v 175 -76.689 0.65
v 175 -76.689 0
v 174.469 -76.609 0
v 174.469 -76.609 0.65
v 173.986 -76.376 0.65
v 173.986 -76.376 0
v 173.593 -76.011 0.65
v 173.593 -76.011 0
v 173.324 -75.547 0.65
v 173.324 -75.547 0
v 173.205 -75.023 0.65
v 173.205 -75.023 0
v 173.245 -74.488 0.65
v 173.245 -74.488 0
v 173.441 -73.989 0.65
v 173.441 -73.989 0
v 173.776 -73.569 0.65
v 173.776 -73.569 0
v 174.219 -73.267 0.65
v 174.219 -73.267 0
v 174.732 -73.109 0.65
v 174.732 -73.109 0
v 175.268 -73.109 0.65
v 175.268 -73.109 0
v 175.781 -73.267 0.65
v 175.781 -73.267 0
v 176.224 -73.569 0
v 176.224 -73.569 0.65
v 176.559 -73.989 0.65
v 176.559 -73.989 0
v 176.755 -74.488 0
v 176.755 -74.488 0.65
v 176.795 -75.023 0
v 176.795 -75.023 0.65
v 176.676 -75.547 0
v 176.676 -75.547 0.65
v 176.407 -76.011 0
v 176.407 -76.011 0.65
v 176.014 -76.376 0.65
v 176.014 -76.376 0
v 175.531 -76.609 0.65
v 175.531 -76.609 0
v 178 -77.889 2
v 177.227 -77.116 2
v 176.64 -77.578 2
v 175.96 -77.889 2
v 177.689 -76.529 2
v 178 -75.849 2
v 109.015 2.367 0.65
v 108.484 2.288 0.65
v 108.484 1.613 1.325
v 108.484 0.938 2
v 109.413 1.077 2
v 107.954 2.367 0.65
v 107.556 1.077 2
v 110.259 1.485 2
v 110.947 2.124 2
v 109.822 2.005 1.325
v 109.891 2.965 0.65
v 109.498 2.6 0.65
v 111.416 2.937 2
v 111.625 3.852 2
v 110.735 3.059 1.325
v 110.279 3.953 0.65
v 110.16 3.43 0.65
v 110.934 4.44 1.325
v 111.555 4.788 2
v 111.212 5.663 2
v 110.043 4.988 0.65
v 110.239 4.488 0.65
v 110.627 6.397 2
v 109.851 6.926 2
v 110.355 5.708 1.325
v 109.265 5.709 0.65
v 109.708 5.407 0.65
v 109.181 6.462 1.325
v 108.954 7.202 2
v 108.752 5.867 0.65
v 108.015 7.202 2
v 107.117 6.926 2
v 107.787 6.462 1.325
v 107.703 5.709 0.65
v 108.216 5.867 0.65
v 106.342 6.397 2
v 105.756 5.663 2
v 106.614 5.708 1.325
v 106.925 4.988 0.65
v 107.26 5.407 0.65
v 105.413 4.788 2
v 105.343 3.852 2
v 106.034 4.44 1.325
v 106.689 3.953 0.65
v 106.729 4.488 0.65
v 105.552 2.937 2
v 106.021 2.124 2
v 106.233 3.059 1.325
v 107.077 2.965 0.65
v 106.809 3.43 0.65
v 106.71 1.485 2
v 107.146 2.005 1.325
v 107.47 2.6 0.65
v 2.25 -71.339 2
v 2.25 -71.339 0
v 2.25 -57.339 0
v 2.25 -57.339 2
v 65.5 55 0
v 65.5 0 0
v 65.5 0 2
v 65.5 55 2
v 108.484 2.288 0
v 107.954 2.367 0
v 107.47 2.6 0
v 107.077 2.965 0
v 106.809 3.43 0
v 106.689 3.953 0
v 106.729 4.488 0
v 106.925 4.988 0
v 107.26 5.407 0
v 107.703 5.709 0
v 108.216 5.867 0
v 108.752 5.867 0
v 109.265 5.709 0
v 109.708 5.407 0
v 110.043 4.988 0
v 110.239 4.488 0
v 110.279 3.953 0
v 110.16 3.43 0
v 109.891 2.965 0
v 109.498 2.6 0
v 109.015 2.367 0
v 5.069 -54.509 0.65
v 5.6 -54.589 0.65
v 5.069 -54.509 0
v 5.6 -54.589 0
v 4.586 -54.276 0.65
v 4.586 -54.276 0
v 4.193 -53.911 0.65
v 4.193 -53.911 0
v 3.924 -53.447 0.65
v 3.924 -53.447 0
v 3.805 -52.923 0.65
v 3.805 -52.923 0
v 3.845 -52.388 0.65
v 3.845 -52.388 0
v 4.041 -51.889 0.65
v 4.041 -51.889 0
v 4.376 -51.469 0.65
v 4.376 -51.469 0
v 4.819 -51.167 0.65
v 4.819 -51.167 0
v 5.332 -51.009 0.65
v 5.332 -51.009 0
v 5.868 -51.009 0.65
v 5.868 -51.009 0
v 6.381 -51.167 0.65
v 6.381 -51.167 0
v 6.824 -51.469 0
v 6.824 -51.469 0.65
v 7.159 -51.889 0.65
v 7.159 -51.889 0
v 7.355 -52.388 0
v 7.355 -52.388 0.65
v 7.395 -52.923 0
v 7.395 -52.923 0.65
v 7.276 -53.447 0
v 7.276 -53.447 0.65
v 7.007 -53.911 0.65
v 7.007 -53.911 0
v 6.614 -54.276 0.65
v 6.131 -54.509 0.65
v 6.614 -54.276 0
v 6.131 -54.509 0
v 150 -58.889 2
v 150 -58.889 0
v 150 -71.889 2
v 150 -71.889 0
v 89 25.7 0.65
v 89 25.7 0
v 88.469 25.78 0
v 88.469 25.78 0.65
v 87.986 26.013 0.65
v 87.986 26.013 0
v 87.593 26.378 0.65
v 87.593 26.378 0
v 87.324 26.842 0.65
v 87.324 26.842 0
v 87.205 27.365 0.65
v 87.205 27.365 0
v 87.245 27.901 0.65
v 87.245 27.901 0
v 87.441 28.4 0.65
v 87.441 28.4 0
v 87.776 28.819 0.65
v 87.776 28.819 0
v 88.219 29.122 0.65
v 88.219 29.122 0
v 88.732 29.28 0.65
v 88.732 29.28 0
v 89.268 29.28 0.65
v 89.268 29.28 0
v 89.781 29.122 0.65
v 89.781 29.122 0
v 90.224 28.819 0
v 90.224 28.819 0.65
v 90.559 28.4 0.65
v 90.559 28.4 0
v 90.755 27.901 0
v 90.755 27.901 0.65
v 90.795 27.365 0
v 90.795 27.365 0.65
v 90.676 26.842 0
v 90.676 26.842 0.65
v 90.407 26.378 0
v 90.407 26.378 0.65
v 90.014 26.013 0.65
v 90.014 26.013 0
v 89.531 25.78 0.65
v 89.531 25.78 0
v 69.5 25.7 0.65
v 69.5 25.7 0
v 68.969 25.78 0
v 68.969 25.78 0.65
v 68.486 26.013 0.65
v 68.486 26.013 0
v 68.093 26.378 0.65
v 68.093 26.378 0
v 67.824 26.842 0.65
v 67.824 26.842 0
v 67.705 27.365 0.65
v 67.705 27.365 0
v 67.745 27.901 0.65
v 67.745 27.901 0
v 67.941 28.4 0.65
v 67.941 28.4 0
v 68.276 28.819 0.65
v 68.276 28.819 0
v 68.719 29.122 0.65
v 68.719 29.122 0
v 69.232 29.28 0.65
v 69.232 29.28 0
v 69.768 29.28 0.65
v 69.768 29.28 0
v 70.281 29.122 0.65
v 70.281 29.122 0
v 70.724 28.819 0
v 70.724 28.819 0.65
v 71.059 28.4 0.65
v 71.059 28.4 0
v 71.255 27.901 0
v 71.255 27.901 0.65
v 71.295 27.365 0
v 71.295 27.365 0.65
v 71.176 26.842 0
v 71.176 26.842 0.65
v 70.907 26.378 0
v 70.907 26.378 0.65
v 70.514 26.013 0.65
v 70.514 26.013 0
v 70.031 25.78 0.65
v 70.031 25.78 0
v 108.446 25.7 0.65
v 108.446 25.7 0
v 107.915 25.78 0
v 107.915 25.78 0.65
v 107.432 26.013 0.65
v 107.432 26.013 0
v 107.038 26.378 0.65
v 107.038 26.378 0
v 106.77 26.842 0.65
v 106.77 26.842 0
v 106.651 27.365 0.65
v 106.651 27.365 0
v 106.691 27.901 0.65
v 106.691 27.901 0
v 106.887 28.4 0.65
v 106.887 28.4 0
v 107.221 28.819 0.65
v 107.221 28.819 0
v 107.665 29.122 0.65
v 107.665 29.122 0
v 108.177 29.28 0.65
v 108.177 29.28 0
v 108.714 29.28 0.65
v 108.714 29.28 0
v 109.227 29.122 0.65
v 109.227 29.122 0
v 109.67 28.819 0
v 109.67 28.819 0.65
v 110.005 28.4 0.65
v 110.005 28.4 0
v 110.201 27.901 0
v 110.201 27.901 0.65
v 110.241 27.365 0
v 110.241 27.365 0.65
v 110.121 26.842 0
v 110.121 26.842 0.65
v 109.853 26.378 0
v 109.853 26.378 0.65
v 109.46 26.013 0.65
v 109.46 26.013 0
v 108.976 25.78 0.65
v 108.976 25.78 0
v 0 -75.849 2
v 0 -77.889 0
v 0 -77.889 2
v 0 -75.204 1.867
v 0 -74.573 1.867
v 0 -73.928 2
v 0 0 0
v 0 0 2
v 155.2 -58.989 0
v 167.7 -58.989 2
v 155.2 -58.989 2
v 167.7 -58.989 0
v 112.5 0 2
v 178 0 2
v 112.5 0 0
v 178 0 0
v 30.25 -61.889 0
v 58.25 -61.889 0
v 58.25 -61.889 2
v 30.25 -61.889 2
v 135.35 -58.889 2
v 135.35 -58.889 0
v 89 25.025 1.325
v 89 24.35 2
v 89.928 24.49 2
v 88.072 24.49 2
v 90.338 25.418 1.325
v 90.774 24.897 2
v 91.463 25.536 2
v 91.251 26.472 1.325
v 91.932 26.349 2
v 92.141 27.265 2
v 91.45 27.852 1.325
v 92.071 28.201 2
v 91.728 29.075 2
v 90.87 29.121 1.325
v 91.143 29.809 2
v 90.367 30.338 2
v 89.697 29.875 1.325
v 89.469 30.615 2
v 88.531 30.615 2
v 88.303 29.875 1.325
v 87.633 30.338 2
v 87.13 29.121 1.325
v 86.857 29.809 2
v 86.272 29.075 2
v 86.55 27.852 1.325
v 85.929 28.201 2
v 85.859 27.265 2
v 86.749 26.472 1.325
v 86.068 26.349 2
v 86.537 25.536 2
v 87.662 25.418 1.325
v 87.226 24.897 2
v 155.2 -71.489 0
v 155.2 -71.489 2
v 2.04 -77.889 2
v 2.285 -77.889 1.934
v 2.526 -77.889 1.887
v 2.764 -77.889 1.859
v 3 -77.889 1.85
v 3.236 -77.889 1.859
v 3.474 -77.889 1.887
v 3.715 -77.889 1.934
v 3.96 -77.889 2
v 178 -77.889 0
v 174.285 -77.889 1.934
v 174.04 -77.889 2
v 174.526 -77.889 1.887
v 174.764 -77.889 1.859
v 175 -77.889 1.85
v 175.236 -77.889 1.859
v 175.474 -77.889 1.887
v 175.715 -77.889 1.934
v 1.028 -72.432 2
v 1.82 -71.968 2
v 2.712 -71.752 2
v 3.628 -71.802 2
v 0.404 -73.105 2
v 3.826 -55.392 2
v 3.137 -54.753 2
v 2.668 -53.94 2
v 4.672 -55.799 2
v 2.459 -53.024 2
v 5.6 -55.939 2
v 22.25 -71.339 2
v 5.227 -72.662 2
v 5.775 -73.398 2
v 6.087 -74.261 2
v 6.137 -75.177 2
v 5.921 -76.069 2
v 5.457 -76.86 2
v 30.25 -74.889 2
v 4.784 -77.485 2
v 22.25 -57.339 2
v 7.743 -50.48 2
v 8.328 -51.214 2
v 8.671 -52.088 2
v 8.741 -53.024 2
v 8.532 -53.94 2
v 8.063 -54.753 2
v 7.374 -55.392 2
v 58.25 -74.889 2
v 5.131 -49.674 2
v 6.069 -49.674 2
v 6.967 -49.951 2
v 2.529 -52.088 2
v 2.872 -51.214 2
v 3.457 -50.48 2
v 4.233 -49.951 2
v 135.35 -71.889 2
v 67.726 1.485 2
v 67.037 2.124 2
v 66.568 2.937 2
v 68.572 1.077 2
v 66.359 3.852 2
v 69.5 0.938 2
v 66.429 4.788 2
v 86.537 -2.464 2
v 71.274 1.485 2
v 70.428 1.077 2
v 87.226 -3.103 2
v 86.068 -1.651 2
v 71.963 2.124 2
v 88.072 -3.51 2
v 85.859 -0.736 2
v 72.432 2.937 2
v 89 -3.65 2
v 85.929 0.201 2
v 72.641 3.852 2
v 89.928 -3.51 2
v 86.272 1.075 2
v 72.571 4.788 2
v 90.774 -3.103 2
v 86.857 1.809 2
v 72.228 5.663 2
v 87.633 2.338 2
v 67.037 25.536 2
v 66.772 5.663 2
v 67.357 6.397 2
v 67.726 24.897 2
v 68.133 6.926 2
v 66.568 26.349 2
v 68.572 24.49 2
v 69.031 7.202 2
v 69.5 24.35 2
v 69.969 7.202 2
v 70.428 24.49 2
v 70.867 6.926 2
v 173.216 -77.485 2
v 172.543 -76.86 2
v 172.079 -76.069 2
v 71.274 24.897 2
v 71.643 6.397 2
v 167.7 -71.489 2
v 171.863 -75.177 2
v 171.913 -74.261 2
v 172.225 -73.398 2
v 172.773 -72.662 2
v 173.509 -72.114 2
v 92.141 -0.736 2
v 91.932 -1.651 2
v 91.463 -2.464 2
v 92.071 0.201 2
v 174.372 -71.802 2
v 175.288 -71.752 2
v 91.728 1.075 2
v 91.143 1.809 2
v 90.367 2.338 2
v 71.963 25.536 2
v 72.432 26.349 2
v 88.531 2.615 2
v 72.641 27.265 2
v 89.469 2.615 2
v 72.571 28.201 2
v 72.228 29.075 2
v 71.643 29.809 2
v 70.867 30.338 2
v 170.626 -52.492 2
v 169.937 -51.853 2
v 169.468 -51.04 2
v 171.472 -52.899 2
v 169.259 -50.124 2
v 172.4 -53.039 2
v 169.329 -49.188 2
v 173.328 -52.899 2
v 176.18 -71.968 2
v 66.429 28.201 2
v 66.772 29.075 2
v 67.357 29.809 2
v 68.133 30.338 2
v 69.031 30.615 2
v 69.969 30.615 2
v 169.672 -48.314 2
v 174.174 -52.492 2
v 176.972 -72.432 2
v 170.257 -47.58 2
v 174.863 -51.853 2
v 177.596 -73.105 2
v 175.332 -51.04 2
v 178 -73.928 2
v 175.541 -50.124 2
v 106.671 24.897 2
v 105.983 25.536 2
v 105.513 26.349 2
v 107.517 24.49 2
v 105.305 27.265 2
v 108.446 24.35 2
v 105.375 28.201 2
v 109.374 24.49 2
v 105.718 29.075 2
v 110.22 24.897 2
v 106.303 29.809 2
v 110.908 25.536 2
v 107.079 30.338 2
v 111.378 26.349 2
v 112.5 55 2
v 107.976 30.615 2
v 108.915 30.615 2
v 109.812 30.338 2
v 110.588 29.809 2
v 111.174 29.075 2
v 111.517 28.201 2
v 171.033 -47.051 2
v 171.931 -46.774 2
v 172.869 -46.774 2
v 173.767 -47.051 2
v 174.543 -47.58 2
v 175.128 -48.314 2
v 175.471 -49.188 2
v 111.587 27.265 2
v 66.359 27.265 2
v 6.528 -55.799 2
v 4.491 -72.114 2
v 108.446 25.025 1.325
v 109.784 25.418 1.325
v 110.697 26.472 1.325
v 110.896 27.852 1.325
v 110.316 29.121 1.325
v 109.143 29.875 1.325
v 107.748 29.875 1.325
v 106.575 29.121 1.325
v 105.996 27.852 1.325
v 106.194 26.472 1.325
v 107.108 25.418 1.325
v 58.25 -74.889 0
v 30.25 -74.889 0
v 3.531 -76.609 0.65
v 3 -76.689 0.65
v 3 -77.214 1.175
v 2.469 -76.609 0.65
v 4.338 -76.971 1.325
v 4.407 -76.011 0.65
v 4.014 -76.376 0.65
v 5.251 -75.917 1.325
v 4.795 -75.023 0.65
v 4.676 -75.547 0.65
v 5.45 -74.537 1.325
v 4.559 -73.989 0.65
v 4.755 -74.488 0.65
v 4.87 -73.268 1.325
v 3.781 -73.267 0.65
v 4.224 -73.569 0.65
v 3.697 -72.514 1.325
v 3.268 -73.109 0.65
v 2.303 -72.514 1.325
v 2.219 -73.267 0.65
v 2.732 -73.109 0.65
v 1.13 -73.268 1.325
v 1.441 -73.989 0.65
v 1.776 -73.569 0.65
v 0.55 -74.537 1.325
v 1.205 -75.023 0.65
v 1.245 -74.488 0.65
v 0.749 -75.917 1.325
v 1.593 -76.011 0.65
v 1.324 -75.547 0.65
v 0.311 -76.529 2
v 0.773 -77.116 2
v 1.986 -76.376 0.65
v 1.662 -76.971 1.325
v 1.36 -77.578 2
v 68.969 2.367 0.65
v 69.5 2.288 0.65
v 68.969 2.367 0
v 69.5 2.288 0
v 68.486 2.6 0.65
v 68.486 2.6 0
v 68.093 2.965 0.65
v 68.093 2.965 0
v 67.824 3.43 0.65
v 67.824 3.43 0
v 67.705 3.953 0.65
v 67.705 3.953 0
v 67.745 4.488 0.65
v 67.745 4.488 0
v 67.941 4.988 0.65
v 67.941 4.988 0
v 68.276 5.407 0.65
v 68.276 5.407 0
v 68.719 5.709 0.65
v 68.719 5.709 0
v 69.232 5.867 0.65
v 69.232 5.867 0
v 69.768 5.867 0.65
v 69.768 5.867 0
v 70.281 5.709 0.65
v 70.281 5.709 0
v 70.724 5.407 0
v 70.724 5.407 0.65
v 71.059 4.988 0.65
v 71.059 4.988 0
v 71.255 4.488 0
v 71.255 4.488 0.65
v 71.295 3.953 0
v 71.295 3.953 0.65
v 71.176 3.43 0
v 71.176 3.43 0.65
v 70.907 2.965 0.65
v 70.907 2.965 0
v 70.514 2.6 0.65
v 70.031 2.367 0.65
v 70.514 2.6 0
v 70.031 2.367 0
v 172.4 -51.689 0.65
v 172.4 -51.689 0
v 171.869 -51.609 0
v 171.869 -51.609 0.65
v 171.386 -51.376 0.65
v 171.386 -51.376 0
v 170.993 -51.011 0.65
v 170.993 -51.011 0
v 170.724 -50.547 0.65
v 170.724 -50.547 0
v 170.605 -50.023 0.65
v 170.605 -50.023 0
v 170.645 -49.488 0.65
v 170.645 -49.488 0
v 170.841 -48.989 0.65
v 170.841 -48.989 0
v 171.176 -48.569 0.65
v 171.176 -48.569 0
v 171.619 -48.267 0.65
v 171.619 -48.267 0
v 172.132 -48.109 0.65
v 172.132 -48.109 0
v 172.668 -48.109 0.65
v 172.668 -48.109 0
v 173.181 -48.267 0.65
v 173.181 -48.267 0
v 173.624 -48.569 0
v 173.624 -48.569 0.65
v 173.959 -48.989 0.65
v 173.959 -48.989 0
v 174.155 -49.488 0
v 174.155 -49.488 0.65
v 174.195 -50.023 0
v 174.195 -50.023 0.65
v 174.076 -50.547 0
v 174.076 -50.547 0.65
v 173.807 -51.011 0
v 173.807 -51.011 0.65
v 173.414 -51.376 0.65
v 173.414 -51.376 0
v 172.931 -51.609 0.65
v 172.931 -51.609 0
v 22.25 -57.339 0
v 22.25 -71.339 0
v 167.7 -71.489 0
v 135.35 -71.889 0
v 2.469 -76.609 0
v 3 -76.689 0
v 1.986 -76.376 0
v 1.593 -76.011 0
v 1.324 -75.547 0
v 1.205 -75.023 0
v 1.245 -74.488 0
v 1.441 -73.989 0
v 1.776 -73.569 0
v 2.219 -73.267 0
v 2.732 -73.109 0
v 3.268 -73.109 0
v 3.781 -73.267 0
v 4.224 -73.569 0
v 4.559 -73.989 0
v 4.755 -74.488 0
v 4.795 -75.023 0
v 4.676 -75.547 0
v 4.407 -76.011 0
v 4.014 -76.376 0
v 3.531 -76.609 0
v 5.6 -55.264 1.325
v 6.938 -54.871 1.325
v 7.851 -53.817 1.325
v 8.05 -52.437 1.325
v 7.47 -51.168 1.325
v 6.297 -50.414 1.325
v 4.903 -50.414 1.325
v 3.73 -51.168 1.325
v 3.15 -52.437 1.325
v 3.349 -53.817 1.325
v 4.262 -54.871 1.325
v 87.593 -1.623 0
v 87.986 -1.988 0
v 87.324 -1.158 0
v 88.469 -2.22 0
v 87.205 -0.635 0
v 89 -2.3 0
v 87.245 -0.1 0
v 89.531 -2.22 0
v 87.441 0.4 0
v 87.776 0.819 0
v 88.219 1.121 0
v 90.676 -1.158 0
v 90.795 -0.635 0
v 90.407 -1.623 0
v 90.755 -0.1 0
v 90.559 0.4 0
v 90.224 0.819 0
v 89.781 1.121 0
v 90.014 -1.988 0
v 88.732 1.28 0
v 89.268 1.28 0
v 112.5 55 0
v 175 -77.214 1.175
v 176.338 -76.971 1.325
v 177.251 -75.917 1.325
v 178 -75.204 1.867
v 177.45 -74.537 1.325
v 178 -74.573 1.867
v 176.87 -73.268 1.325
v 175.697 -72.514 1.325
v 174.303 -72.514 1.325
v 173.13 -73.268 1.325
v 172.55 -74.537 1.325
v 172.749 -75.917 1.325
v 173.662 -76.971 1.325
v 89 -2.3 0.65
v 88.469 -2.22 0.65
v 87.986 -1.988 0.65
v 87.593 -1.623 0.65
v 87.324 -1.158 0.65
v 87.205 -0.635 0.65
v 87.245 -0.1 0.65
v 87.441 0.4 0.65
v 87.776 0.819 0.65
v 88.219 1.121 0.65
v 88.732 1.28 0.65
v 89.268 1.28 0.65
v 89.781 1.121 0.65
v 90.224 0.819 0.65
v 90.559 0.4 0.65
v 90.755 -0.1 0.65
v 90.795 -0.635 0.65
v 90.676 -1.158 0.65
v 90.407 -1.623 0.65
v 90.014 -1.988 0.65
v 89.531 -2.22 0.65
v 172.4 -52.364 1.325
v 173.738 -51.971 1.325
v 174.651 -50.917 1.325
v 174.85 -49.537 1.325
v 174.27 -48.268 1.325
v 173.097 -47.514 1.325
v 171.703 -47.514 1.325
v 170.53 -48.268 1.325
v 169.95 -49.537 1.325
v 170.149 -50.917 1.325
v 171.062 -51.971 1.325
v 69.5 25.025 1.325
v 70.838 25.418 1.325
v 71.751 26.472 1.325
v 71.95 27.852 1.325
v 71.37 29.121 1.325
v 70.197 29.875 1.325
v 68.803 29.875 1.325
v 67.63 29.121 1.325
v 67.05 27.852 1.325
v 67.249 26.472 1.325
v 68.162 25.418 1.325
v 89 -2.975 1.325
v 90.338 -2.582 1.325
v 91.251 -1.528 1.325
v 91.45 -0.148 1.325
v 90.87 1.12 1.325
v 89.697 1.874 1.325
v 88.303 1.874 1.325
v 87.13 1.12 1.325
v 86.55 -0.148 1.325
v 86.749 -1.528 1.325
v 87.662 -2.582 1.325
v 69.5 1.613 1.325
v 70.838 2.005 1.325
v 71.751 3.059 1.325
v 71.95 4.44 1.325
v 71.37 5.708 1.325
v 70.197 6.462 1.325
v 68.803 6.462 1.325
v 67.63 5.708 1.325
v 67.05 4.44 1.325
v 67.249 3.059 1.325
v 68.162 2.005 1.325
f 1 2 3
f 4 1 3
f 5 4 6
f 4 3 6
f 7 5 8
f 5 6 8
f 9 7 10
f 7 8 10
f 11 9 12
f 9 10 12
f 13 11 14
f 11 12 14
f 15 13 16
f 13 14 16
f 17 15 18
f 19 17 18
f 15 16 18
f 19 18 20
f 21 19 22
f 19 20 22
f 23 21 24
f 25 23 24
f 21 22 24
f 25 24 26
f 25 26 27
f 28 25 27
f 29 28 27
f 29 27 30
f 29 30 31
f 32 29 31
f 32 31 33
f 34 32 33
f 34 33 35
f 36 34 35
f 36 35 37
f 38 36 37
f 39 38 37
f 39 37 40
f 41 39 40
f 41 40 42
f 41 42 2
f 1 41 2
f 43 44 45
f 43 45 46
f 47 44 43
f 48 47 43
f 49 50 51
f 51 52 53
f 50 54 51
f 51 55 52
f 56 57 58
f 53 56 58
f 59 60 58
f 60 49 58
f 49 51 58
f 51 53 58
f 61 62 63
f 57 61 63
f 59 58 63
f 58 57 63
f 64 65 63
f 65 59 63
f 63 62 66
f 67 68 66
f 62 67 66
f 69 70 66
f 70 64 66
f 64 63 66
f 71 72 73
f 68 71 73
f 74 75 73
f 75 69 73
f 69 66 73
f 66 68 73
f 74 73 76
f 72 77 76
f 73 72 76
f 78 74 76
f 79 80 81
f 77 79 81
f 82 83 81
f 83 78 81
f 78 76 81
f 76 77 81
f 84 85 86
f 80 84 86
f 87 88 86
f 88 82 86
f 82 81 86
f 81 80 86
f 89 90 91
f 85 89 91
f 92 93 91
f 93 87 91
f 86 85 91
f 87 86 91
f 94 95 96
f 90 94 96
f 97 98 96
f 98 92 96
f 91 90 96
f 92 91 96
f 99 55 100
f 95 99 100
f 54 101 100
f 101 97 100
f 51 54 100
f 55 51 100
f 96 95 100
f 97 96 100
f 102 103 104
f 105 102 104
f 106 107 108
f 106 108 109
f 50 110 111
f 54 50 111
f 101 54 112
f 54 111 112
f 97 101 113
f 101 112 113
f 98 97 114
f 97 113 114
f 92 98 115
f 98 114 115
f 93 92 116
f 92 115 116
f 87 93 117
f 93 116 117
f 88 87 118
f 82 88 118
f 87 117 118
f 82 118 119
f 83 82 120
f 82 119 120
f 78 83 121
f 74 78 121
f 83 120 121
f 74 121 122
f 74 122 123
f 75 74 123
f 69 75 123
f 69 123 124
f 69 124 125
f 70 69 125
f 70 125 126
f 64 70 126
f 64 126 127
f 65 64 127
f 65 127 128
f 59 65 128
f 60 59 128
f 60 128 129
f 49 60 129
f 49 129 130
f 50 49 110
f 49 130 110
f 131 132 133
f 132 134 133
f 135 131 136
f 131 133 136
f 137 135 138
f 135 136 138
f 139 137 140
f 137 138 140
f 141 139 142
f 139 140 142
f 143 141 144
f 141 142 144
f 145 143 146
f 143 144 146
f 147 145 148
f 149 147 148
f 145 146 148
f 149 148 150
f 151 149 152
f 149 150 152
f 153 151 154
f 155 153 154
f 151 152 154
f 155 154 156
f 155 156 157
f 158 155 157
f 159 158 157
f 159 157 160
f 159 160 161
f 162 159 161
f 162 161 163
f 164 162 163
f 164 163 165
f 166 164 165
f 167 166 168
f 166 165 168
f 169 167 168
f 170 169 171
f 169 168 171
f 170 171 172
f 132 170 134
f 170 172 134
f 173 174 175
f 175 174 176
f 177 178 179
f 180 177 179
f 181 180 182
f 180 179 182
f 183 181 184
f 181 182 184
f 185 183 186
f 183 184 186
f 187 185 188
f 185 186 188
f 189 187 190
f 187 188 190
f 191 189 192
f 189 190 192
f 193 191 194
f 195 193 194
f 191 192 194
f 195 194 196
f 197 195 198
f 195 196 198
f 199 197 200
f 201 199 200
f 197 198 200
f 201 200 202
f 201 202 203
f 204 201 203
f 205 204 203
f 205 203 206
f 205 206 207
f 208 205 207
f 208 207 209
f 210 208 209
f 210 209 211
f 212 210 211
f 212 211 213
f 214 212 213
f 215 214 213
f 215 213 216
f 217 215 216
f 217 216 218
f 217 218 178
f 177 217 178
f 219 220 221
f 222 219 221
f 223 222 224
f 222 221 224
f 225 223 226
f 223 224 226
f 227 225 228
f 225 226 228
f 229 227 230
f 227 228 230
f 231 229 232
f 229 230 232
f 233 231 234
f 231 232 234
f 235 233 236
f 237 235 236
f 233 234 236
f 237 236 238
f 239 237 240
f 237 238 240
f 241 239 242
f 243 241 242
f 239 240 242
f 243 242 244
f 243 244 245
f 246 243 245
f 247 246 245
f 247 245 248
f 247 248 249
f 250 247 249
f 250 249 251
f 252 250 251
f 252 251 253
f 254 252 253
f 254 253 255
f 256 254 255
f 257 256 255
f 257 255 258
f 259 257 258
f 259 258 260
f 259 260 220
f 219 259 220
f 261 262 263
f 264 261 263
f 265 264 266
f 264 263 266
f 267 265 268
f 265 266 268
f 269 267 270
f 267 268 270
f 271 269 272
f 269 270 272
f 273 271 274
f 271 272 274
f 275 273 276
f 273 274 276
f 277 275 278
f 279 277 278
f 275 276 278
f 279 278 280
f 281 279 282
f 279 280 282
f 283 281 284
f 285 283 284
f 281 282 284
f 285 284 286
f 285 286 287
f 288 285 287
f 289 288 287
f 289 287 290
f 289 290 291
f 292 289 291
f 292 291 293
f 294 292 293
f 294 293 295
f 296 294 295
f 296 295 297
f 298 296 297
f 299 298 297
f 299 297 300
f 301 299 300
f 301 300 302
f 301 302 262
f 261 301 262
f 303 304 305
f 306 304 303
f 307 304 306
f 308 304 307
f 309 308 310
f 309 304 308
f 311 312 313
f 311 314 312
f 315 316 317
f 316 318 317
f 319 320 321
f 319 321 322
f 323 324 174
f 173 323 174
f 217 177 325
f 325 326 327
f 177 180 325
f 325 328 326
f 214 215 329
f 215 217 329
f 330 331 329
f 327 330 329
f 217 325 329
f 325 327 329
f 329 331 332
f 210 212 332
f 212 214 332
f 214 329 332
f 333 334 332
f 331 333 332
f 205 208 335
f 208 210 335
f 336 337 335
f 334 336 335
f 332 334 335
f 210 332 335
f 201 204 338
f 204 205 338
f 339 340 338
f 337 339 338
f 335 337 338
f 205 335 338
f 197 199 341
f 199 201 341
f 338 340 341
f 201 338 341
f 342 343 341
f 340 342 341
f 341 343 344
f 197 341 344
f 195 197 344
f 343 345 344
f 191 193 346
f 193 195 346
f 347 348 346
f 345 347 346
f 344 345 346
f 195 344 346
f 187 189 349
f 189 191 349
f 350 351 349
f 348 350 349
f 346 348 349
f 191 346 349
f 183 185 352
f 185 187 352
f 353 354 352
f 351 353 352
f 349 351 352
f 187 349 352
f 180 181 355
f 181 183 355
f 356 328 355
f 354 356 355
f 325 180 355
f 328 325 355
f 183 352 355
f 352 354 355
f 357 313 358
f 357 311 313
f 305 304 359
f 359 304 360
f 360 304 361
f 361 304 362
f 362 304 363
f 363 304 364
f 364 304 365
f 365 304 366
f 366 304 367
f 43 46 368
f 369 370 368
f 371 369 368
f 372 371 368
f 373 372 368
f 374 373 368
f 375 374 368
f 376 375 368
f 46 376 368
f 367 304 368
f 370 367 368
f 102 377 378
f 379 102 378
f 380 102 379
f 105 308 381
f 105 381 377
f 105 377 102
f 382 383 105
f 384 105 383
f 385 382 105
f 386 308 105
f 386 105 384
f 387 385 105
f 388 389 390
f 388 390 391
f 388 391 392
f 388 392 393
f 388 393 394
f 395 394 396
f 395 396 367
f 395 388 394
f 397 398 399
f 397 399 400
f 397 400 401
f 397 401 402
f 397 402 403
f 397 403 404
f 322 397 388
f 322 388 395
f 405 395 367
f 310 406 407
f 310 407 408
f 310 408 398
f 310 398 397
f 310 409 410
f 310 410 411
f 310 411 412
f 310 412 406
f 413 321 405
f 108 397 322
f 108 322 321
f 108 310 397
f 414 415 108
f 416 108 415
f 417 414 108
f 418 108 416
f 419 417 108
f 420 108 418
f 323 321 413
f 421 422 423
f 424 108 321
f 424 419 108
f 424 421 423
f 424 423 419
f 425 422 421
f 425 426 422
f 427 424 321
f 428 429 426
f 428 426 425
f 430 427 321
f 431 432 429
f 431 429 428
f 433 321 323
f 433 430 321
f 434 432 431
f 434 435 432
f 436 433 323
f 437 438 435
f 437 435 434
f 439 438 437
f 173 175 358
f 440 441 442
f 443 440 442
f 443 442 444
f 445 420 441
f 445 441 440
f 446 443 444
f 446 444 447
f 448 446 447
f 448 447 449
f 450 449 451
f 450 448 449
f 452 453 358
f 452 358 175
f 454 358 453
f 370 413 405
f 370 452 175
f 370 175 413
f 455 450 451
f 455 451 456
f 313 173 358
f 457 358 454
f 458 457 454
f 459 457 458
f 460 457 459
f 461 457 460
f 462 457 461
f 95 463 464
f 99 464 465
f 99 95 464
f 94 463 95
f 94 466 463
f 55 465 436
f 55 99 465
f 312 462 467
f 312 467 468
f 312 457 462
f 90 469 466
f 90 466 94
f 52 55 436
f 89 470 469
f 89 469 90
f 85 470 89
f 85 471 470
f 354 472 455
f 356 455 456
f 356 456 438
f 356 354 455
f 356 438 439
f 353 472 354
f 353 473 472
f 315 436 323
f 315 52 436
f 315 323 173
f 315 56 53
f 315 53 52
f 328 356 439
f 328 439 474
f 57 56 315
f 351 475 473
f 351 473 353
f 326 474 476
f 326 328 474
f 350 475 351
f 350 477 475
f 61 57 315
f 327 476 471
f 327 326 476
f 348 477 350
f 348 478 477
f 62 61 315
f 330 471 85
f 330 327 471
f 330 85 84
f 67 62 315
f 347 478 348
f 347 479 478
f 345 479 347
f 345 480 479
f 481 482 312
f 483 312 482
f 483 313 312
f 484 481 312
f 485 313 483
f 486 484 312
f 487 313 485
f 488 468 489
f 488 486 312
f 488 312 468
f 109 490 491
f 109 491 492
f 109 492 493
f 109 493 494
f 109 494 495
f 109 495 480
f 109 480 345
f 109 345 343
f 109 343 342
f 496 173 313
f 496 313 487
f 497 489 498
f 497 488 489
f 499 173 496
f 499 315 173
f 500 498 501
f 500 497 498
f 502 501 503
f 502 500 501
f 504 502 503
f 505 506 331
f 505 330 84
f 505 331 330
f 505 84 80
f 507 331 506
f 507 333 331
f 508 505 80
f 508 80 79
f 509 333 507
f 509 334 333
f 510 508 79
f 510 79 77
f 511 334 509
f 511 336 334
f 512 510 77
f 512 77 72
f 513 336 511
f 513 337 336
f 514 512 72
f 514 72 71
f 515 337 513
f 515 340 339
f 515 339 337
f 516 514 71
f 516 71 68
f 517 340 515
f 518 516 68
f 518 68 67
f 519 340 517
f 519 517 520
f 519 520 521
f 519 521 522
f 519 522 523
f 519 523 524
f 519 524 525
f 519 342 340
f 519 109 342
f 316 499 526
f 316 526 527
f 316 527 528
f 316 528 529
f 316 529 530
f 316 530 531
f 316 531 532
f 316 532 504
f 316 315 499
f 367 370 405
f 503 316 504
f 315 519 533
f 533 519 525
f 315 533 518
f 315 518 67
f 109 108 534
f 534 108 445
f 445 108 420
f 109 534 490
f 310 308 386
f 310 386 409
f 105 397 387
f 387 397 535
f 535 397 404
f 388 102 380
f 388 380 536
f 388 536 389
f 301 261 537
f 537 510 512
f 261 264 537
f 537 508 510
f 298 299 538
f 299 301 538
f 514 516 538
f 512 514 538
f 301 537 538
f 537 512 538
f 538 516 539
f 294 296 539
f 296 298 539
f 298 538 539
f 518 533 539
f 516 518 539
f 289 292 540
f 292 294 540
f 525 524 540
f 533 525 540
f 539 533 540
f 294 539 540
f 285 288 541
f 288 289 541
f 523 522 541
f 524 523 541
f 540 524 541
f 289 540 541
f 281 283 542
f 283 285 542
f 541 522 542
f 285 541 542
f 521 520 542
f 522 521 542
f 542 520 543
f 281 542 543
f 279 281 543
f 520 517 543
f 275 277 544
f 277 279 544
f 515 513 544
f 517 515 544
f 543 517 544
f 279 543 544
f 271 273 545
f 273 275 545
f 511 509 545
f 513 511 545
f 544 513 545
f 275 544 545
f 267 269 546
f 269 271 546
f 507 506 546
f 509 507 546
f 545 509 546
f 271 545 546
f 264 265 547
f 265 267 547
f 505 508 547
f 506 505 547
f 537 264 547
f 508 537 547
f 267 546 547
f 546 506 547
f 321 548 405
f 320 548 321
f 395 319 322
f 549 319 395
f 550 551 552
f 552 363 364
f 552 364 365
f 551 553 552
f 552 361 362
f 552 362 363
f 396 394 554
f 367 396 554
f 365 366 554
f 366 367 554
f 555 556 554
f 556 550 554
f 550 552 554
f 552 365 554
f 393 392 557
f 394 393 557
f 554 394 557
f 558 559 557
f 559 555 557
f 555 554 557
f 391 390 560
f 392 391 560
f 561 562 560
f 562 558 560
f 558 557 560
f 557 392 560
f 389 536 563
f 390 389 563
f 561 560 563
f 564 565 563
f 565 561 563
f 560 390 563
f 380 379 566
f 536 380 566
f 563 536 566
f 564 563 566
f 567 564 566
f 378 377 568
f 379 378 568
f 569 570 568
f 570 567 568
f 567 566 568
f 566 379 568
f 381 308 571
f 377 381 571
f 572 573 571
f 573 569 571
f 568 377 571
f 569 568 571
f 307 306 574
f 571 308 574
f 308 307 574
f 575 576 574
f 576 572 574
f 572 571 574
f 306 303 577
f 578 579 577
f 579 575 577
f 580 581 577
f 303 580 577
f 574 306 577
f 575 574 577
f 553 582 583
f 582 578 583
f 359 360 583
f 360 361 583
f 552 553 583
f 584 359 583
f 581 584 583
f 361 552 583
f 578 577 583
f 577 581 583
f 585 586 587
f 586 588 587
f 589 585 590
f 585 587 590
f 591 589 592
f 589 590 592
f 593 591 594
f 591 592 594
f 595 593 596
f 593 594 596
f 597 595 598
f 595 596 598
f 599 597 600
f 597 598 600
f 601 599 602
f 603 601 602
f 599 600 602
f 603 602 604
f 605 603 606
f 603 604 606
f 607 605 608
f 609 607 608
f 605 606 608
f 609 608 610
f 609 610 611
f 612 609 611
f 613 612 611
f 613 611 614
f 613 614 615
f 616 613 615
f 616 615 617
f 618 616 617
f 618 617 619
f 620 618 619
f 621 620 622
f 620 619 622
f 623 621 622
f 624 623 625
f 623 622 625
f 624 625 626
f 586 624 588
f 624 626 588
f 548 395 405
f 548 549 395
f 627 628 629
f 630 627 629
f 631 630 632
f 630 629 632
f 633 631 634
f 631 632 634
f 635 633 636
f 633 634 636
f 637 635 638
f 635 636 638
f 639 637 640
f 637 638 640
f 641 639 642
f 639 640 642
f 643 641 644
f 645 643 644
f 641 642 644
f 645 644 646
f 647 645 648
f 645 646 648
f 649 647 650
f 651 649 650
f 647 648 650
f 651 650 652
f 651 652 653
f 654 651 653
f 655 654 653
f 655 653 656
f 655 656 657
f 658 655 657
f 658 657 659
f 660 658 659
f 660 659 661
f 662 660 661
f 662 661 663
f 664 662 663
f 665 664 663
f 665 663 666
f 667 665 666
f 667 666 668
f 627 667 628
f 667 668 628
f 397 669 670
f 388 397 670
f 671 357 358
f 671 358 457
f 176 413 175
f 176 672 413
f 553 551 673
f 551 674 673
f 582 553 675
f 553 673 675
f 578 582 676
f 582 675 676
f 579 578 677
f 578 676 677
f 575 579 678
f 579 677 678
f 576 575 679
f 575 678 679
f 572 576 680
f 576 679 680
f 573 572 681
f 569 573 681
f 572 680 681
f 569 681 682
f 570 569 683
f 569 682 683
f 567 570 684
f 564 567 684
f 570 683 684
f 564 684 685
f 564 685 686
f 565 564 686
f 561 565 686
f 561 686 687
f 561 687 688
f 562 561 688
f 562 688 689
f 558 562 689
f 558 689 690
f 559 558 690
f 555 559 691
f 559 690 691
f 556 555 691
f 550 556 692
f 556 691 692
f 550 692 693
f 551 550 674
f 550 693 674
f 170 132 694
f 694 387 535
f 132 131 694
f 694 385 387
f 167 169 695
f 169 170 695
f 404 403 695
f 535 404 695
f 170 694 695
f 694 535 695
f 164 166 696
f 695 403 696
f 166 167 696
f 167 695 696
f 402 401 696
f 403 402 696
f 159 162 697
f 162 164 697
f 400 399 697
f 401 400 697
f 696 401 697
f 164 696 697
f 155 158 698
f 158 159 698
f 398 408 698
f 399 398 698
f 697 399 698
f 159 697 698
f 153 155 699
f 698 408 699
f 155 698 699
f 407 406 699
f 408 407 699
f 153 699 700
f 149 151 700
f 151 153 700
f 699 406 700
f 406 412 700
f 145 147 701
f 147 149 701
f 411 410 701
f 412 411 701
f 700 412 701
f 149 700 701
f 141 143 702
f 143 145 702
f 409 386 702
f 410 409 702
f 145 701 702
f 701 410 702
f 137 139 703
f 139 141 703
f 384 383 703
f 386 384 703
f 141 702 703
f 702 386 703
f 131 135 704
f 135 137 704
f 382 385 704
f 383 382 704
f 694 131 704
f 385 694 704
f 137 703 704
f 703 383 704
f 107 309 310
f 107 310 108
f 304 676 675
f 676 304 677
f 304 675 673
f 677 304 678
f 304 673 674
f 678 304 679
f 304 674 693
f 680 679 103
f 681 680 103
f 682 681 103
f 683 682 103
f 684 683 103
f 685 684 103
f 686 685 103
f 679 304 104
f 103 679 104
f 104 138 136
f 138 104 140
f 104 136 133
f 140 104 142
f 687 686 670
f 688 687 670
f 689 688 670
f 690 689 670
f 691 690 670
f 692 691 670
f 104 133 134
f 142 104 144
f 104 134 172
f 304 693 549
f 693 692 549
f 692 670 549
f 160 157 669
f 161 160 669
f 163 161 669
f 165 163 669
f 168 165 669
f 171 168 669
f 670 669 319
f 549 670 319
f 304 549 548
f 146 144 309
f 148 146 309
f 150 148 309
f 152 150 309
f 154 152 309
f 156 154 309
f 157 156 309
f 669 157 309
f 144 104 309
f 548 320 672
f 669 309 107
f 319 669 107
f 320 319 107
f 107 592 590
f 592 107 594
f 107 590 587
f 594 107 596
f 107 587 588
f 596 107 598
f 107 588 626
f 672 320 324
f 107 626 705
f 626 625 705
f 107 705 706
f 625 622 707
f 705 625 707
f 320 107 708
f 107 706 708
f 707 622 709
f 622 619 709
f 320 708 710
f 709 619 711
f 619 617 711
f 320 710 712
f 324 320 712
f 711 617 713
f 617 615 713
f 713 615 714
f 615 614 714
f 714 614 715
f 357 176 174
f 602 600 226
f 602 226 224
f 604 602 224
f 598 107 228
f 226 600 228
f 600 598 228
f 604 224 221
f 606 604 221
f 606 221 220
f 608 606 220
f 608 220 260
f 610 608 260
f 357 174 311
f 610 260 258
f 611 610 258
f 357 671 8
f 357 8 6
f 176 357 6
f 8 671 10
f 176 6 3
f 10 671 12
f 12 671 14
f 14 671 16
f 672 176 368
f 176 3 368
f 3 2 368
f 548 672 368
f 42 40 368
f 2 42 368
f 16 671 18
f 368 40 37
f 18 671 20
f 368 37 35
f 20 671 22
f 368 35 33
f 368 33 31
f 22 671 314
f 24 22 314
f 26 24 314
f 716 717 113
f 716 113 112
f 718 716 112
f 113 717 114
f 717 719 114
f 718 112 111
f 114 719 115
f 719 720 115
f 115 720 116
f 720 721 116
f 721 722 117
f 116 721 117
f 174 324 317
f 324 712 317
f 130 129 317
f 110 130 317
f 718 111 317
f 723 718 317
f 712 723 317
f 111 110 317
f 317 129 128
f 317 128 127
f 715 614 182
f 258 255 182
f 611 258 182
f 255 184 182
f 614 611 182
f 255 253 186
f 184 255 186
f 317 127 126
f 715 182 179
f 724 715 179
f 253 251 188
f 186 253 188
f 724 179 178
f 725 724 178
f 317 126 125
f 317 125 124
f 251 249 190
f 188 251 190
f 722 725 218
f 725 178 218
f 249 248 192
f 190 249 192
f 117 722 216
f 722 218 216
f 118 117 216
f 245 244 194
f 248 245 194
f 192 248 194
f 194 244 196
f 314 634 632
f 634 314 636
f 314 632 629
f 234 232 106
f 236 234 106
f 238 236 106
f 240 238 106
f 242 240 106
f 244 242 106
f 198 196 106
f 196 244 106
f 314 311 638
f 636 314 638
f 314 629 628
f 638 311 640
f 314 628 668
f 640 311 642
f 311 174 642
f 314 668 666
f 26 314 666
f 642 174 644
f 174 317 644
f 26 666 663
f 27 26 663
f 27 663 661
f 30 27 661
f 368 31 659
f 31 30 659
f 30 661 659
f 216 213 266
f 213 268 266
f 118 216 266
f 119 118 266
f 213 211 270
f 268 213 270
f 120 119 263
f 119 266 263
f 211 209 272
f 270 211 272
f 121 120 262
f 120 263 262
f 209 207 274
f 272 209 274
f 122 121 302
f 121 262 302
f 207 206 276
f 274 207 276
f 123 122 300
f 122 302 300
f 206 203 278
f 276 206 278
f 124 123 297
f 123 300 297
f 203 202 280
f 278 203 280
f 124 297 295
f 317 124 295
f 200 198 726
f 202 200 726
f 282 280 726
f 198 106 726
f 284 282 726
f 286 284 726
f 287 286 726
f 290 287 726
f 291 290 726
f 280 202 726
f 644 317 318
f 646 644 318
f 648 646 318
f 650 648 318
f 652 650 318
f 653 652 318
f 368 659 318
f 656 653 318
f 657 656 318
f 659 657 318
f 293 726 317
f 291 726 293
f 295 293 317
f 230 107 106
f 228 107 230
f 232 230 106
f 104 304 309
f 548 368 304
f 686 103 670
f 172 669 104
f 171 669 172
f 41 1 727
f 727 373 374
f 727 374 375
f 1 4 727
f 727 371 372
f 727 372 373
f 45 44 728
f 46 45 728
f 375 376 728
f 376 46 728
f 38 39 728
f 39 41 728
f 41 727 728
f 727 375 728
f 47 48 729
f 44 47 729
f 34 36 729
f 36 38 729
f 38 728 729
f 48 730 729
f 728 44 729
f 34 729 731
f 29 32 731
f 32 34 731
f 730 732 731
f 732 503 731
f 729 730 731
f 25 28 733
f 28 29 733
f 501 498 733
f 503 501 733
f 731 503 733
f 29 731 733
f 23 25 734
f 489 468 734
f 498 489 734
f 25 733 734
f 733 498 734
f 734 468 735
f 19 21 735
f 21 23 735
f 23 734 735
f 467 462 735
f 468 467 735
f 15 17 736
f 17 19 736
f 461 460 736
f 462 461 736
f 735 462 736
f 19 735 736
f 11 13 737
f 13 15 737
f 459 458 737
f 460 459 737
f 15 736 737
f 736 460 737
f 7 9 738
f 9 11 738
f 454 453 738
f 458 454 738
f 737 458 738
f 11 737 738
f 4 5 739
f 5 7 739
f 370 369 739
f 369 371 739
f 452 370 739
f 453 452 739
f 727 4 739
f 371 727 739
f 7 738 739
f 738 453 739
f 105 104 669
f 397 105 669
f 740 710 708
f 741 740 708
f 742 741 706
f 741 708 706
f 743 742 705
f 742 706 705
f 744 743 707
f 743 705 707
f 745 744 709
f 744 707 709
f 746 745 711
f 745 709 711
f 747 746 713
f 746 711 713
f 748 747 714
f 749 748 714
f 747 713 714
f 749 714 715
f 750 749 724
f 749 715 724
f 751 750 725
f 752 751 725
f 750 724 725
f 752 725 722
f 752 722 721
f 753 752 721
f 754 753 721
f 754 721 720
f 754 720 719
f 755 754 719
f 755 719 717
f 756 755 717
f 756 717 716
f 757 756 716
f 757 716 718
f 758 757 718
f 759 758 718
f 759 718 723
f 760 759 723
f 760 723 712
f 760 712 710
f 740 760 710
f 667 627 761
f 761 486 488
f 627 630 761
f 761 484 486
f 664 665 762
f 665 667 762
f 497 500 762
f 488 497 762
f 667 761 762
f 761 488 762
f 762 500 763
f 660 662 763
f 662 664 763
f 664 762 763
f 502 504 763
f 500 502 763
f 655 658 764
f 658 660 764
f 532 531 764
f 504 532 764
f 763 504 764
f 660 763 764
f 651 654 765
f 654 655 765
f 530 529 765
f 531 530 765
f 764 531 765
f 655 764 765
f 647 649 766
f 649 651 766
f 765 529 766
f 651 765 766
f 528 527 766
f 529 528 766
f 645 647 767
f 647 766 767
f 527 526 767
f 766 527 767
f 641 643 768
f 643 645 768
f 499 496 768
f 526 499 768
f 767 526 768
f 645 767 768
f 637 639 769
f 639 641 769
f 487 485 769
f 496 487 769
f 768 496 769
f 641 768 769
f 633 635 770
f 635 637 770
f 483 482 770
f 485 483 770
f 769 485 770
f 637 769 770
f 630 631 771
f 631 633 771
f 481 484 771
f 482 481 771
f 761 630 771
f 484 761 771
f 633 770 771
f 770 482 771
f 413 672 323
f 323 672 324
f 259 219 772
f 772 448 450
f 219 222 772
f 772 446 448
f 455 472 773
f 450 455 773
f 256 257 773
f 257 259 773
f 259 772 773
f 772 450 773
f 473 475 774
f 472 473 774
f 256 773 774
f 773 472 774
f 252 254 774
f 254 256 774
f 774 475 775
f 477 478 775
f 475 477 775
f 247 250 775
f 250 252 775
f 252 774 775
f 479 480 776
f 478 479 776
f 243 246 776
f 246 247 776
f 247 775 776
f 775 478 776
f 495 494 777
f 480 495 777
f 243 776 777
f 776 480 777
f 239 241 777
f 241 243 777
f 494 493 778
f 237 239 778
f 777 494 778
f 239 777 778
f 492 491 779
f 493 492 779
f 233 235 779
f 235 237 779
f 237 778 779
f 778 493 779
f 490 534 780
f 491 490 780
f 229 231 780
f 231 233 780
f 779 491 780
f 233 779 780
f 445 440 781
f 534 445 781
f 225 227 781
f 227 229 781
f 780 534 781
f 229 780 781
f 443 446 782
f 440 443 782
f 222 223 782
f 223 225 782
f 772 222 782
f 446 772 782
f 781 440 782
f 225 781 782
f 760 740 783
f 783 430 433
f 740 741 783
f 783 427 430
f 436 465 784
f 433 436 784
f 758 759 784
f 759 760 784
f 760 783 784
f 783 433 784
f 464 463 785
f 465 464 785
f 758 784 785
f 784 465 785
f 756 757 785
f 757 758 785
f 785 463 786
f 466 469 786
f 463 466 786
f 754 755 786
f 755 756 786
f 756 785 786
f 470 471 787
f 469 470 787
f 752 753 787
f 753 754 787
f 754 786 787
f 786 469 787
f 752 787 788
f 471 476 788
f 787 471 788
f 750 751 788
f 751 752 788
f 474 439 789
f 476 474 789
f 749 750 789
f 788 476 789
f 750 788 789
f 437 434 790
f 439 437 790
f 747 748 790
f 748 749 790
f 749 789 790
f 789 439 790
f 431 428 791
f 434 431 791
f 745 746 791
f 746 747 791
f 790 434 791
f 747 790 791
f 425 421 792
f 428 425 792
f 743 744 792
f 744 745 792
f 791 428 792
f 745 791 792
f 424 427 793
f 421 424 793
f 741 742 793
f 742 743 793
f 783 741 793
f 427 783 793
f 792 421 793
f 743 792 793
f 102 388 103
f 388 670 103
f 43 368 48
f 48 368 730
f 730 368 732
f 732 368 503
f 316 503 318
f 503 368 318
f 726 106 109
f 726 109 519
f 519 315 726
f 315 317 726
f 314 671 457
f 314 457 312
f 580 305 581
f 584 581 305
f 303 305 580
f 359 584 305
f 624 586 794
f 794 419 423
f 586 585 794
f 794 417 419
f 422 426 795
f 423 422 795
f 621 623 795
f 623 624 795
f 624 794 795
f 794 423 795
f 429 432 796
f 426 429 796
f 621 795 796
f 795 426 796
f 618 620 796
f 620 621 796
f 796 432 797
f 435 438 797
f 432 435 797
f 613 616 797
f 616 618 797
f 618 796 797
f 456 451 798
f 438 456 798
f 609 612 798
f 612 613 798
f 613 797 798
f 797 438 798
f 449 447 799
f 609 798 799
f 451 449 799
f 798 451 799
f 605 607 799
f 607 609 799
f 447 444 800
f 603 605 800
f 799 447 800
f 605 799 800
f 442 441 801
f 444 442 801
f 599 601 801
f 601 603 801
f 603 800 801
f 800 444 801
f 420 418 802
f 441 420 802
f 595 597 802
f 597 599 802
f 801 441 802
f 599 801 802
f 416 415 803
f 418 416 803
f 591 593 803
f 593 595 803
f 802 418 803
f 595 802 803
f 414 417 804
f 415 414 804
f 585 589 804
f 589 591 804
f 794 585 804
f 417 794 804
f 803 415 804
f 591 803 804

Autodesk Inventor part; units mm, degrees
ref_plane "YZ Plane" through (0, 0, 0) normal (1, 0, 0) x (0, 1, 0)
ref_plane "XZ Plane" through (0, 0, 0) normal (0, 1, 0) x (-1, 0, 0)
ref_plane "XY Plane" through (0, 0, 0) normal (0, 0, 1) x (1, 0, 0)
ref_plane "Work Plane1" through (0, 0, 0) normal (0, 0, 1) x (1, 0, 0)
sketch "Sketch1" plane through (0, 0, 0) normal (0, 0, 1) x (1, 0, 0)
  circle A0 centre (3, -74.8889) radius 2.3 projected
  line L0 (3, 0) -> (3, -44.7889) projected
  line L1 (0, 0) -> (3, 0) projected
  line L2 (0, -77.8889) -> (0, 0) projected
  line L3 (0, -77.8889) -> (6, -77.8889) projected
  line L4 (6, -71.8889) -> (6, -77.8889) projected
  line L5 (6, -71.8889) -> (1.6, -71.8889) projected
  line L6 (1.6, -71.8889) -> (1.6, -56.7889) projected
  line L7 (1.6, -56.7889) -> (9.6, -56.7889) projected
  line L8 (9.6, -44.7889) -> (9.6, -56.7889) projected
  line L9 (3, -44.7889) -> (9.6, -44.7889) projected
  circle A1 centre (5.6, -52.7889) radius 2.6 projected
  circle A2 centre (172.4, -49.8889) radius 2.6 projected
  circle A3 centre (175, -74.8889) radius 2.3 projected
  line L10 (168.4, -41.8889) -> (175, -41.8889) projected
  line L11 (168.4, -53.8889) -> (168.4, -41.8889) projected
  line L12 (175, -53.8889) -> (168.4, -53.8889) projected
  line L13 (175, -53.8889) -> (175, -71.8889) projected
  line L14 (175, -71.8889) -> (172, -71.8889) projected
  line L15 (172, -71.8889) -> (172, -77.8889) projected
  line L16 (178, -77.8889) -> (172, -77.8889) projected
  line L17 (178, -77.8889) -> (178, 0) projected
  line L18 (178, 0) -> (175, 0) projected
  line L19 (175, 0) -> (175, -41.8889) projected
  line L20 (65.5, 41.9823) -> (65.5, 55) projected
  line L21 (112.5, 41.9823) -> (112.5, 55) projected
  line L22 (62.4925, 0) -> (3, 0) projected
  line L23 (115.5075, 0) -> (175, 0) projected
  line L24 (65.5, 55) -> (112.5, 55)
  line L25 (112.5, 55) -> (112.5, 0)
  line L26 (112.5, 0) -> (65.5, 0)
  line L27 (65.5, 0) -> (65.5, 55)
  line L28 (178, 0) -> (0, 0)
  line L29 (0, 0) -> (0, -77.8889)
  line L30 (0, -77.8889) -> (178, -77.8889)
  line L31 (178, -77.8889) -> (178, 0)
  line L32 (31.25, -62.8889) -> (31.25, -73.8889) projected
  line L33 (31.25, -73.8889) -> (57.25, -73.8889) projected
  line L34 (57.25, -73.8889) -> (57.25, -62.8889) projected
  line L35 (57.25, -62.8889) -> (31.25, -62.8889) projected
  line L36 (21.2501, -70.339) -> (21.2501, -58.3388) projected
  line L37 (21.2501, -58.3388) -> (3.2499, -58.3388) projected
  line L38 (3.2499, -70.339) -> (21.2501, -70.339) projected
  line L39 (3.2499, -58.3388) -> (3.2499, -70.339) projected
  line L40 (156.2, -70.4889) -> (156.2, -59.9889) projected
  line L41 (166.7, -59.9889) -> (156.2, -59.9889) projected
  line L42 (166.7, -59.9889) -> (166.7, -70.4889) projected
  line L43 (156.2, -70.4889) -> (166.7, -70.4889) projected
  line L44 (149, -59.8889) -> (149, -70.8889) projected
  line L45 (149, -70.8889) -> (136.35, -70.8889) projected
  line L46 (136.35, -70.8889) -> (136.35, -59.8889) projected
  line L47 (136.35, -59.8889) -> (149, -59.8889) projected
  line L48 (135, -53.8889) -> (135, -71.8889) projected
  line L49 (135, -71.8889) -> (175, -71.8889) projected
  line L50 (175, -71.8889) -> (175, -53.8889) projected
  line L51 (175, -53.8889) -> (135, -53.8889) projected
  circle A4 centre (137.85, -56.7389) radius 1.5 projected
  circle A5 centre (172.15, -56.7389) radius 1.5 projected
  line L52 (2.2499, -57.3388) -> (22.2501, -57.3388)
  line L53 (22.2501, -57.3388) -> (22.2501, -71.339)
  line L54 (22.2501, -71.339) -> (2.2499, -71.339)
  line L55 (2.2499, -71.339) -> (2.2499, -57.3388)
  line L56 (30.25, -61.8889) -> (30.25, -74.8889)
  line L57 (30.25, -74.8889) -> (58.25, -74.8889)
  line L58 (58.25, -74.8889) -> (58.25, -61.8889)
  line L59 (58.25, -61.8889) -> (30.25, -61.8889)
  line L60 (155.2, -58.9889) -> (155.2, -71.4889)
  line L61 (155.2, -71.4889) -> (167.7, -71.4889)
  line L62 (167.7, -71.4889) -> (167.7, -58.9889)
  line L63 (167.7, -58.9889) -> (155.2, -58.9889)
  line L64 (150, -58.8889) -> (150, -71.8889)
  line L65 (150, -71.8889) -> (135.35, -71.8889)
  line L66 (135.35, -71.8889) -> (135.35, -58.8889)
  line L67 (135.35, -58.8889) -> (150, -58.8889)
  dimension "d0" = 1
  dimension "d1" = 1
  dimension "d2" = 1
  dimension "d3" = 1
extrude "Extrusion1" add sketch "Sketch1" along normal blind 2 contours A0 | L22 L28 L26 L23 L19 L10 L11 L51 L48 L49 L15 L30 L4 L5 L6 L7 L8 L9 L0 | L0 L9 L8 L7 L6 L5 L4 L3 L2 L1 | L27 L20 L24 L21 L25 L26 | L15 L14 L13 L12 L11 L10 L19 L18 L17 L16 | L49 L64 L67 L66 L48 L51 L12 L13 L14 | A1 | A2 | A3 | A4 | A5
sketch "Sketch2" plane through (0, 0, 2) normal (0, 0, 1) x (1, 0, 0)
  circle A0 centre (3, -74.8889) radius 2 projected
  circle A1 centre (5.6, -52.7889) radius 2.6 projected
  circle A2 centre (172.4, -49.8889) radius 2.6 projected
  circle A3 centre (175, -74.8889) radius 2 projected
  circle A4 centre (108.4457, 27.5) radius 2.3 projected
  circle A5 centre (69.5, 27.5) radius 2.3 projected
  circle A6 centre (69.5, 4.0875) radius 2.3 projected
  circle A7 centre (108.4841, 4.0875) radius 2.3 projected
  circle A8 centre (89, -0.5003) radius 2.3 projected
  circle A9 centre (89, 27.5) radius 2.3 projected
  point P0 (0, 0)
hole "Hole1" at (3, -74.8889, 2) at (5.6, -52.7889, 2) at (175, -74.8889, 2) at (172.4, -49.8889, 2) at (89, -0.5003, 2) at (69.5, 4.0875, 2) at (108.4841, 4.0875, 2) at (89, 27.5, 2) at (69.5, 27.5, 2) at (108.4457, 27.5, 2) direction (0, 0, -1) diameter 3.6 end through all countersink diameter 6.3 countersink angle 90 clearance for "Countersunk Flat Head Screw ISO 2009/7046" size "M3" standard "ISO"
properties part number "ceil"
